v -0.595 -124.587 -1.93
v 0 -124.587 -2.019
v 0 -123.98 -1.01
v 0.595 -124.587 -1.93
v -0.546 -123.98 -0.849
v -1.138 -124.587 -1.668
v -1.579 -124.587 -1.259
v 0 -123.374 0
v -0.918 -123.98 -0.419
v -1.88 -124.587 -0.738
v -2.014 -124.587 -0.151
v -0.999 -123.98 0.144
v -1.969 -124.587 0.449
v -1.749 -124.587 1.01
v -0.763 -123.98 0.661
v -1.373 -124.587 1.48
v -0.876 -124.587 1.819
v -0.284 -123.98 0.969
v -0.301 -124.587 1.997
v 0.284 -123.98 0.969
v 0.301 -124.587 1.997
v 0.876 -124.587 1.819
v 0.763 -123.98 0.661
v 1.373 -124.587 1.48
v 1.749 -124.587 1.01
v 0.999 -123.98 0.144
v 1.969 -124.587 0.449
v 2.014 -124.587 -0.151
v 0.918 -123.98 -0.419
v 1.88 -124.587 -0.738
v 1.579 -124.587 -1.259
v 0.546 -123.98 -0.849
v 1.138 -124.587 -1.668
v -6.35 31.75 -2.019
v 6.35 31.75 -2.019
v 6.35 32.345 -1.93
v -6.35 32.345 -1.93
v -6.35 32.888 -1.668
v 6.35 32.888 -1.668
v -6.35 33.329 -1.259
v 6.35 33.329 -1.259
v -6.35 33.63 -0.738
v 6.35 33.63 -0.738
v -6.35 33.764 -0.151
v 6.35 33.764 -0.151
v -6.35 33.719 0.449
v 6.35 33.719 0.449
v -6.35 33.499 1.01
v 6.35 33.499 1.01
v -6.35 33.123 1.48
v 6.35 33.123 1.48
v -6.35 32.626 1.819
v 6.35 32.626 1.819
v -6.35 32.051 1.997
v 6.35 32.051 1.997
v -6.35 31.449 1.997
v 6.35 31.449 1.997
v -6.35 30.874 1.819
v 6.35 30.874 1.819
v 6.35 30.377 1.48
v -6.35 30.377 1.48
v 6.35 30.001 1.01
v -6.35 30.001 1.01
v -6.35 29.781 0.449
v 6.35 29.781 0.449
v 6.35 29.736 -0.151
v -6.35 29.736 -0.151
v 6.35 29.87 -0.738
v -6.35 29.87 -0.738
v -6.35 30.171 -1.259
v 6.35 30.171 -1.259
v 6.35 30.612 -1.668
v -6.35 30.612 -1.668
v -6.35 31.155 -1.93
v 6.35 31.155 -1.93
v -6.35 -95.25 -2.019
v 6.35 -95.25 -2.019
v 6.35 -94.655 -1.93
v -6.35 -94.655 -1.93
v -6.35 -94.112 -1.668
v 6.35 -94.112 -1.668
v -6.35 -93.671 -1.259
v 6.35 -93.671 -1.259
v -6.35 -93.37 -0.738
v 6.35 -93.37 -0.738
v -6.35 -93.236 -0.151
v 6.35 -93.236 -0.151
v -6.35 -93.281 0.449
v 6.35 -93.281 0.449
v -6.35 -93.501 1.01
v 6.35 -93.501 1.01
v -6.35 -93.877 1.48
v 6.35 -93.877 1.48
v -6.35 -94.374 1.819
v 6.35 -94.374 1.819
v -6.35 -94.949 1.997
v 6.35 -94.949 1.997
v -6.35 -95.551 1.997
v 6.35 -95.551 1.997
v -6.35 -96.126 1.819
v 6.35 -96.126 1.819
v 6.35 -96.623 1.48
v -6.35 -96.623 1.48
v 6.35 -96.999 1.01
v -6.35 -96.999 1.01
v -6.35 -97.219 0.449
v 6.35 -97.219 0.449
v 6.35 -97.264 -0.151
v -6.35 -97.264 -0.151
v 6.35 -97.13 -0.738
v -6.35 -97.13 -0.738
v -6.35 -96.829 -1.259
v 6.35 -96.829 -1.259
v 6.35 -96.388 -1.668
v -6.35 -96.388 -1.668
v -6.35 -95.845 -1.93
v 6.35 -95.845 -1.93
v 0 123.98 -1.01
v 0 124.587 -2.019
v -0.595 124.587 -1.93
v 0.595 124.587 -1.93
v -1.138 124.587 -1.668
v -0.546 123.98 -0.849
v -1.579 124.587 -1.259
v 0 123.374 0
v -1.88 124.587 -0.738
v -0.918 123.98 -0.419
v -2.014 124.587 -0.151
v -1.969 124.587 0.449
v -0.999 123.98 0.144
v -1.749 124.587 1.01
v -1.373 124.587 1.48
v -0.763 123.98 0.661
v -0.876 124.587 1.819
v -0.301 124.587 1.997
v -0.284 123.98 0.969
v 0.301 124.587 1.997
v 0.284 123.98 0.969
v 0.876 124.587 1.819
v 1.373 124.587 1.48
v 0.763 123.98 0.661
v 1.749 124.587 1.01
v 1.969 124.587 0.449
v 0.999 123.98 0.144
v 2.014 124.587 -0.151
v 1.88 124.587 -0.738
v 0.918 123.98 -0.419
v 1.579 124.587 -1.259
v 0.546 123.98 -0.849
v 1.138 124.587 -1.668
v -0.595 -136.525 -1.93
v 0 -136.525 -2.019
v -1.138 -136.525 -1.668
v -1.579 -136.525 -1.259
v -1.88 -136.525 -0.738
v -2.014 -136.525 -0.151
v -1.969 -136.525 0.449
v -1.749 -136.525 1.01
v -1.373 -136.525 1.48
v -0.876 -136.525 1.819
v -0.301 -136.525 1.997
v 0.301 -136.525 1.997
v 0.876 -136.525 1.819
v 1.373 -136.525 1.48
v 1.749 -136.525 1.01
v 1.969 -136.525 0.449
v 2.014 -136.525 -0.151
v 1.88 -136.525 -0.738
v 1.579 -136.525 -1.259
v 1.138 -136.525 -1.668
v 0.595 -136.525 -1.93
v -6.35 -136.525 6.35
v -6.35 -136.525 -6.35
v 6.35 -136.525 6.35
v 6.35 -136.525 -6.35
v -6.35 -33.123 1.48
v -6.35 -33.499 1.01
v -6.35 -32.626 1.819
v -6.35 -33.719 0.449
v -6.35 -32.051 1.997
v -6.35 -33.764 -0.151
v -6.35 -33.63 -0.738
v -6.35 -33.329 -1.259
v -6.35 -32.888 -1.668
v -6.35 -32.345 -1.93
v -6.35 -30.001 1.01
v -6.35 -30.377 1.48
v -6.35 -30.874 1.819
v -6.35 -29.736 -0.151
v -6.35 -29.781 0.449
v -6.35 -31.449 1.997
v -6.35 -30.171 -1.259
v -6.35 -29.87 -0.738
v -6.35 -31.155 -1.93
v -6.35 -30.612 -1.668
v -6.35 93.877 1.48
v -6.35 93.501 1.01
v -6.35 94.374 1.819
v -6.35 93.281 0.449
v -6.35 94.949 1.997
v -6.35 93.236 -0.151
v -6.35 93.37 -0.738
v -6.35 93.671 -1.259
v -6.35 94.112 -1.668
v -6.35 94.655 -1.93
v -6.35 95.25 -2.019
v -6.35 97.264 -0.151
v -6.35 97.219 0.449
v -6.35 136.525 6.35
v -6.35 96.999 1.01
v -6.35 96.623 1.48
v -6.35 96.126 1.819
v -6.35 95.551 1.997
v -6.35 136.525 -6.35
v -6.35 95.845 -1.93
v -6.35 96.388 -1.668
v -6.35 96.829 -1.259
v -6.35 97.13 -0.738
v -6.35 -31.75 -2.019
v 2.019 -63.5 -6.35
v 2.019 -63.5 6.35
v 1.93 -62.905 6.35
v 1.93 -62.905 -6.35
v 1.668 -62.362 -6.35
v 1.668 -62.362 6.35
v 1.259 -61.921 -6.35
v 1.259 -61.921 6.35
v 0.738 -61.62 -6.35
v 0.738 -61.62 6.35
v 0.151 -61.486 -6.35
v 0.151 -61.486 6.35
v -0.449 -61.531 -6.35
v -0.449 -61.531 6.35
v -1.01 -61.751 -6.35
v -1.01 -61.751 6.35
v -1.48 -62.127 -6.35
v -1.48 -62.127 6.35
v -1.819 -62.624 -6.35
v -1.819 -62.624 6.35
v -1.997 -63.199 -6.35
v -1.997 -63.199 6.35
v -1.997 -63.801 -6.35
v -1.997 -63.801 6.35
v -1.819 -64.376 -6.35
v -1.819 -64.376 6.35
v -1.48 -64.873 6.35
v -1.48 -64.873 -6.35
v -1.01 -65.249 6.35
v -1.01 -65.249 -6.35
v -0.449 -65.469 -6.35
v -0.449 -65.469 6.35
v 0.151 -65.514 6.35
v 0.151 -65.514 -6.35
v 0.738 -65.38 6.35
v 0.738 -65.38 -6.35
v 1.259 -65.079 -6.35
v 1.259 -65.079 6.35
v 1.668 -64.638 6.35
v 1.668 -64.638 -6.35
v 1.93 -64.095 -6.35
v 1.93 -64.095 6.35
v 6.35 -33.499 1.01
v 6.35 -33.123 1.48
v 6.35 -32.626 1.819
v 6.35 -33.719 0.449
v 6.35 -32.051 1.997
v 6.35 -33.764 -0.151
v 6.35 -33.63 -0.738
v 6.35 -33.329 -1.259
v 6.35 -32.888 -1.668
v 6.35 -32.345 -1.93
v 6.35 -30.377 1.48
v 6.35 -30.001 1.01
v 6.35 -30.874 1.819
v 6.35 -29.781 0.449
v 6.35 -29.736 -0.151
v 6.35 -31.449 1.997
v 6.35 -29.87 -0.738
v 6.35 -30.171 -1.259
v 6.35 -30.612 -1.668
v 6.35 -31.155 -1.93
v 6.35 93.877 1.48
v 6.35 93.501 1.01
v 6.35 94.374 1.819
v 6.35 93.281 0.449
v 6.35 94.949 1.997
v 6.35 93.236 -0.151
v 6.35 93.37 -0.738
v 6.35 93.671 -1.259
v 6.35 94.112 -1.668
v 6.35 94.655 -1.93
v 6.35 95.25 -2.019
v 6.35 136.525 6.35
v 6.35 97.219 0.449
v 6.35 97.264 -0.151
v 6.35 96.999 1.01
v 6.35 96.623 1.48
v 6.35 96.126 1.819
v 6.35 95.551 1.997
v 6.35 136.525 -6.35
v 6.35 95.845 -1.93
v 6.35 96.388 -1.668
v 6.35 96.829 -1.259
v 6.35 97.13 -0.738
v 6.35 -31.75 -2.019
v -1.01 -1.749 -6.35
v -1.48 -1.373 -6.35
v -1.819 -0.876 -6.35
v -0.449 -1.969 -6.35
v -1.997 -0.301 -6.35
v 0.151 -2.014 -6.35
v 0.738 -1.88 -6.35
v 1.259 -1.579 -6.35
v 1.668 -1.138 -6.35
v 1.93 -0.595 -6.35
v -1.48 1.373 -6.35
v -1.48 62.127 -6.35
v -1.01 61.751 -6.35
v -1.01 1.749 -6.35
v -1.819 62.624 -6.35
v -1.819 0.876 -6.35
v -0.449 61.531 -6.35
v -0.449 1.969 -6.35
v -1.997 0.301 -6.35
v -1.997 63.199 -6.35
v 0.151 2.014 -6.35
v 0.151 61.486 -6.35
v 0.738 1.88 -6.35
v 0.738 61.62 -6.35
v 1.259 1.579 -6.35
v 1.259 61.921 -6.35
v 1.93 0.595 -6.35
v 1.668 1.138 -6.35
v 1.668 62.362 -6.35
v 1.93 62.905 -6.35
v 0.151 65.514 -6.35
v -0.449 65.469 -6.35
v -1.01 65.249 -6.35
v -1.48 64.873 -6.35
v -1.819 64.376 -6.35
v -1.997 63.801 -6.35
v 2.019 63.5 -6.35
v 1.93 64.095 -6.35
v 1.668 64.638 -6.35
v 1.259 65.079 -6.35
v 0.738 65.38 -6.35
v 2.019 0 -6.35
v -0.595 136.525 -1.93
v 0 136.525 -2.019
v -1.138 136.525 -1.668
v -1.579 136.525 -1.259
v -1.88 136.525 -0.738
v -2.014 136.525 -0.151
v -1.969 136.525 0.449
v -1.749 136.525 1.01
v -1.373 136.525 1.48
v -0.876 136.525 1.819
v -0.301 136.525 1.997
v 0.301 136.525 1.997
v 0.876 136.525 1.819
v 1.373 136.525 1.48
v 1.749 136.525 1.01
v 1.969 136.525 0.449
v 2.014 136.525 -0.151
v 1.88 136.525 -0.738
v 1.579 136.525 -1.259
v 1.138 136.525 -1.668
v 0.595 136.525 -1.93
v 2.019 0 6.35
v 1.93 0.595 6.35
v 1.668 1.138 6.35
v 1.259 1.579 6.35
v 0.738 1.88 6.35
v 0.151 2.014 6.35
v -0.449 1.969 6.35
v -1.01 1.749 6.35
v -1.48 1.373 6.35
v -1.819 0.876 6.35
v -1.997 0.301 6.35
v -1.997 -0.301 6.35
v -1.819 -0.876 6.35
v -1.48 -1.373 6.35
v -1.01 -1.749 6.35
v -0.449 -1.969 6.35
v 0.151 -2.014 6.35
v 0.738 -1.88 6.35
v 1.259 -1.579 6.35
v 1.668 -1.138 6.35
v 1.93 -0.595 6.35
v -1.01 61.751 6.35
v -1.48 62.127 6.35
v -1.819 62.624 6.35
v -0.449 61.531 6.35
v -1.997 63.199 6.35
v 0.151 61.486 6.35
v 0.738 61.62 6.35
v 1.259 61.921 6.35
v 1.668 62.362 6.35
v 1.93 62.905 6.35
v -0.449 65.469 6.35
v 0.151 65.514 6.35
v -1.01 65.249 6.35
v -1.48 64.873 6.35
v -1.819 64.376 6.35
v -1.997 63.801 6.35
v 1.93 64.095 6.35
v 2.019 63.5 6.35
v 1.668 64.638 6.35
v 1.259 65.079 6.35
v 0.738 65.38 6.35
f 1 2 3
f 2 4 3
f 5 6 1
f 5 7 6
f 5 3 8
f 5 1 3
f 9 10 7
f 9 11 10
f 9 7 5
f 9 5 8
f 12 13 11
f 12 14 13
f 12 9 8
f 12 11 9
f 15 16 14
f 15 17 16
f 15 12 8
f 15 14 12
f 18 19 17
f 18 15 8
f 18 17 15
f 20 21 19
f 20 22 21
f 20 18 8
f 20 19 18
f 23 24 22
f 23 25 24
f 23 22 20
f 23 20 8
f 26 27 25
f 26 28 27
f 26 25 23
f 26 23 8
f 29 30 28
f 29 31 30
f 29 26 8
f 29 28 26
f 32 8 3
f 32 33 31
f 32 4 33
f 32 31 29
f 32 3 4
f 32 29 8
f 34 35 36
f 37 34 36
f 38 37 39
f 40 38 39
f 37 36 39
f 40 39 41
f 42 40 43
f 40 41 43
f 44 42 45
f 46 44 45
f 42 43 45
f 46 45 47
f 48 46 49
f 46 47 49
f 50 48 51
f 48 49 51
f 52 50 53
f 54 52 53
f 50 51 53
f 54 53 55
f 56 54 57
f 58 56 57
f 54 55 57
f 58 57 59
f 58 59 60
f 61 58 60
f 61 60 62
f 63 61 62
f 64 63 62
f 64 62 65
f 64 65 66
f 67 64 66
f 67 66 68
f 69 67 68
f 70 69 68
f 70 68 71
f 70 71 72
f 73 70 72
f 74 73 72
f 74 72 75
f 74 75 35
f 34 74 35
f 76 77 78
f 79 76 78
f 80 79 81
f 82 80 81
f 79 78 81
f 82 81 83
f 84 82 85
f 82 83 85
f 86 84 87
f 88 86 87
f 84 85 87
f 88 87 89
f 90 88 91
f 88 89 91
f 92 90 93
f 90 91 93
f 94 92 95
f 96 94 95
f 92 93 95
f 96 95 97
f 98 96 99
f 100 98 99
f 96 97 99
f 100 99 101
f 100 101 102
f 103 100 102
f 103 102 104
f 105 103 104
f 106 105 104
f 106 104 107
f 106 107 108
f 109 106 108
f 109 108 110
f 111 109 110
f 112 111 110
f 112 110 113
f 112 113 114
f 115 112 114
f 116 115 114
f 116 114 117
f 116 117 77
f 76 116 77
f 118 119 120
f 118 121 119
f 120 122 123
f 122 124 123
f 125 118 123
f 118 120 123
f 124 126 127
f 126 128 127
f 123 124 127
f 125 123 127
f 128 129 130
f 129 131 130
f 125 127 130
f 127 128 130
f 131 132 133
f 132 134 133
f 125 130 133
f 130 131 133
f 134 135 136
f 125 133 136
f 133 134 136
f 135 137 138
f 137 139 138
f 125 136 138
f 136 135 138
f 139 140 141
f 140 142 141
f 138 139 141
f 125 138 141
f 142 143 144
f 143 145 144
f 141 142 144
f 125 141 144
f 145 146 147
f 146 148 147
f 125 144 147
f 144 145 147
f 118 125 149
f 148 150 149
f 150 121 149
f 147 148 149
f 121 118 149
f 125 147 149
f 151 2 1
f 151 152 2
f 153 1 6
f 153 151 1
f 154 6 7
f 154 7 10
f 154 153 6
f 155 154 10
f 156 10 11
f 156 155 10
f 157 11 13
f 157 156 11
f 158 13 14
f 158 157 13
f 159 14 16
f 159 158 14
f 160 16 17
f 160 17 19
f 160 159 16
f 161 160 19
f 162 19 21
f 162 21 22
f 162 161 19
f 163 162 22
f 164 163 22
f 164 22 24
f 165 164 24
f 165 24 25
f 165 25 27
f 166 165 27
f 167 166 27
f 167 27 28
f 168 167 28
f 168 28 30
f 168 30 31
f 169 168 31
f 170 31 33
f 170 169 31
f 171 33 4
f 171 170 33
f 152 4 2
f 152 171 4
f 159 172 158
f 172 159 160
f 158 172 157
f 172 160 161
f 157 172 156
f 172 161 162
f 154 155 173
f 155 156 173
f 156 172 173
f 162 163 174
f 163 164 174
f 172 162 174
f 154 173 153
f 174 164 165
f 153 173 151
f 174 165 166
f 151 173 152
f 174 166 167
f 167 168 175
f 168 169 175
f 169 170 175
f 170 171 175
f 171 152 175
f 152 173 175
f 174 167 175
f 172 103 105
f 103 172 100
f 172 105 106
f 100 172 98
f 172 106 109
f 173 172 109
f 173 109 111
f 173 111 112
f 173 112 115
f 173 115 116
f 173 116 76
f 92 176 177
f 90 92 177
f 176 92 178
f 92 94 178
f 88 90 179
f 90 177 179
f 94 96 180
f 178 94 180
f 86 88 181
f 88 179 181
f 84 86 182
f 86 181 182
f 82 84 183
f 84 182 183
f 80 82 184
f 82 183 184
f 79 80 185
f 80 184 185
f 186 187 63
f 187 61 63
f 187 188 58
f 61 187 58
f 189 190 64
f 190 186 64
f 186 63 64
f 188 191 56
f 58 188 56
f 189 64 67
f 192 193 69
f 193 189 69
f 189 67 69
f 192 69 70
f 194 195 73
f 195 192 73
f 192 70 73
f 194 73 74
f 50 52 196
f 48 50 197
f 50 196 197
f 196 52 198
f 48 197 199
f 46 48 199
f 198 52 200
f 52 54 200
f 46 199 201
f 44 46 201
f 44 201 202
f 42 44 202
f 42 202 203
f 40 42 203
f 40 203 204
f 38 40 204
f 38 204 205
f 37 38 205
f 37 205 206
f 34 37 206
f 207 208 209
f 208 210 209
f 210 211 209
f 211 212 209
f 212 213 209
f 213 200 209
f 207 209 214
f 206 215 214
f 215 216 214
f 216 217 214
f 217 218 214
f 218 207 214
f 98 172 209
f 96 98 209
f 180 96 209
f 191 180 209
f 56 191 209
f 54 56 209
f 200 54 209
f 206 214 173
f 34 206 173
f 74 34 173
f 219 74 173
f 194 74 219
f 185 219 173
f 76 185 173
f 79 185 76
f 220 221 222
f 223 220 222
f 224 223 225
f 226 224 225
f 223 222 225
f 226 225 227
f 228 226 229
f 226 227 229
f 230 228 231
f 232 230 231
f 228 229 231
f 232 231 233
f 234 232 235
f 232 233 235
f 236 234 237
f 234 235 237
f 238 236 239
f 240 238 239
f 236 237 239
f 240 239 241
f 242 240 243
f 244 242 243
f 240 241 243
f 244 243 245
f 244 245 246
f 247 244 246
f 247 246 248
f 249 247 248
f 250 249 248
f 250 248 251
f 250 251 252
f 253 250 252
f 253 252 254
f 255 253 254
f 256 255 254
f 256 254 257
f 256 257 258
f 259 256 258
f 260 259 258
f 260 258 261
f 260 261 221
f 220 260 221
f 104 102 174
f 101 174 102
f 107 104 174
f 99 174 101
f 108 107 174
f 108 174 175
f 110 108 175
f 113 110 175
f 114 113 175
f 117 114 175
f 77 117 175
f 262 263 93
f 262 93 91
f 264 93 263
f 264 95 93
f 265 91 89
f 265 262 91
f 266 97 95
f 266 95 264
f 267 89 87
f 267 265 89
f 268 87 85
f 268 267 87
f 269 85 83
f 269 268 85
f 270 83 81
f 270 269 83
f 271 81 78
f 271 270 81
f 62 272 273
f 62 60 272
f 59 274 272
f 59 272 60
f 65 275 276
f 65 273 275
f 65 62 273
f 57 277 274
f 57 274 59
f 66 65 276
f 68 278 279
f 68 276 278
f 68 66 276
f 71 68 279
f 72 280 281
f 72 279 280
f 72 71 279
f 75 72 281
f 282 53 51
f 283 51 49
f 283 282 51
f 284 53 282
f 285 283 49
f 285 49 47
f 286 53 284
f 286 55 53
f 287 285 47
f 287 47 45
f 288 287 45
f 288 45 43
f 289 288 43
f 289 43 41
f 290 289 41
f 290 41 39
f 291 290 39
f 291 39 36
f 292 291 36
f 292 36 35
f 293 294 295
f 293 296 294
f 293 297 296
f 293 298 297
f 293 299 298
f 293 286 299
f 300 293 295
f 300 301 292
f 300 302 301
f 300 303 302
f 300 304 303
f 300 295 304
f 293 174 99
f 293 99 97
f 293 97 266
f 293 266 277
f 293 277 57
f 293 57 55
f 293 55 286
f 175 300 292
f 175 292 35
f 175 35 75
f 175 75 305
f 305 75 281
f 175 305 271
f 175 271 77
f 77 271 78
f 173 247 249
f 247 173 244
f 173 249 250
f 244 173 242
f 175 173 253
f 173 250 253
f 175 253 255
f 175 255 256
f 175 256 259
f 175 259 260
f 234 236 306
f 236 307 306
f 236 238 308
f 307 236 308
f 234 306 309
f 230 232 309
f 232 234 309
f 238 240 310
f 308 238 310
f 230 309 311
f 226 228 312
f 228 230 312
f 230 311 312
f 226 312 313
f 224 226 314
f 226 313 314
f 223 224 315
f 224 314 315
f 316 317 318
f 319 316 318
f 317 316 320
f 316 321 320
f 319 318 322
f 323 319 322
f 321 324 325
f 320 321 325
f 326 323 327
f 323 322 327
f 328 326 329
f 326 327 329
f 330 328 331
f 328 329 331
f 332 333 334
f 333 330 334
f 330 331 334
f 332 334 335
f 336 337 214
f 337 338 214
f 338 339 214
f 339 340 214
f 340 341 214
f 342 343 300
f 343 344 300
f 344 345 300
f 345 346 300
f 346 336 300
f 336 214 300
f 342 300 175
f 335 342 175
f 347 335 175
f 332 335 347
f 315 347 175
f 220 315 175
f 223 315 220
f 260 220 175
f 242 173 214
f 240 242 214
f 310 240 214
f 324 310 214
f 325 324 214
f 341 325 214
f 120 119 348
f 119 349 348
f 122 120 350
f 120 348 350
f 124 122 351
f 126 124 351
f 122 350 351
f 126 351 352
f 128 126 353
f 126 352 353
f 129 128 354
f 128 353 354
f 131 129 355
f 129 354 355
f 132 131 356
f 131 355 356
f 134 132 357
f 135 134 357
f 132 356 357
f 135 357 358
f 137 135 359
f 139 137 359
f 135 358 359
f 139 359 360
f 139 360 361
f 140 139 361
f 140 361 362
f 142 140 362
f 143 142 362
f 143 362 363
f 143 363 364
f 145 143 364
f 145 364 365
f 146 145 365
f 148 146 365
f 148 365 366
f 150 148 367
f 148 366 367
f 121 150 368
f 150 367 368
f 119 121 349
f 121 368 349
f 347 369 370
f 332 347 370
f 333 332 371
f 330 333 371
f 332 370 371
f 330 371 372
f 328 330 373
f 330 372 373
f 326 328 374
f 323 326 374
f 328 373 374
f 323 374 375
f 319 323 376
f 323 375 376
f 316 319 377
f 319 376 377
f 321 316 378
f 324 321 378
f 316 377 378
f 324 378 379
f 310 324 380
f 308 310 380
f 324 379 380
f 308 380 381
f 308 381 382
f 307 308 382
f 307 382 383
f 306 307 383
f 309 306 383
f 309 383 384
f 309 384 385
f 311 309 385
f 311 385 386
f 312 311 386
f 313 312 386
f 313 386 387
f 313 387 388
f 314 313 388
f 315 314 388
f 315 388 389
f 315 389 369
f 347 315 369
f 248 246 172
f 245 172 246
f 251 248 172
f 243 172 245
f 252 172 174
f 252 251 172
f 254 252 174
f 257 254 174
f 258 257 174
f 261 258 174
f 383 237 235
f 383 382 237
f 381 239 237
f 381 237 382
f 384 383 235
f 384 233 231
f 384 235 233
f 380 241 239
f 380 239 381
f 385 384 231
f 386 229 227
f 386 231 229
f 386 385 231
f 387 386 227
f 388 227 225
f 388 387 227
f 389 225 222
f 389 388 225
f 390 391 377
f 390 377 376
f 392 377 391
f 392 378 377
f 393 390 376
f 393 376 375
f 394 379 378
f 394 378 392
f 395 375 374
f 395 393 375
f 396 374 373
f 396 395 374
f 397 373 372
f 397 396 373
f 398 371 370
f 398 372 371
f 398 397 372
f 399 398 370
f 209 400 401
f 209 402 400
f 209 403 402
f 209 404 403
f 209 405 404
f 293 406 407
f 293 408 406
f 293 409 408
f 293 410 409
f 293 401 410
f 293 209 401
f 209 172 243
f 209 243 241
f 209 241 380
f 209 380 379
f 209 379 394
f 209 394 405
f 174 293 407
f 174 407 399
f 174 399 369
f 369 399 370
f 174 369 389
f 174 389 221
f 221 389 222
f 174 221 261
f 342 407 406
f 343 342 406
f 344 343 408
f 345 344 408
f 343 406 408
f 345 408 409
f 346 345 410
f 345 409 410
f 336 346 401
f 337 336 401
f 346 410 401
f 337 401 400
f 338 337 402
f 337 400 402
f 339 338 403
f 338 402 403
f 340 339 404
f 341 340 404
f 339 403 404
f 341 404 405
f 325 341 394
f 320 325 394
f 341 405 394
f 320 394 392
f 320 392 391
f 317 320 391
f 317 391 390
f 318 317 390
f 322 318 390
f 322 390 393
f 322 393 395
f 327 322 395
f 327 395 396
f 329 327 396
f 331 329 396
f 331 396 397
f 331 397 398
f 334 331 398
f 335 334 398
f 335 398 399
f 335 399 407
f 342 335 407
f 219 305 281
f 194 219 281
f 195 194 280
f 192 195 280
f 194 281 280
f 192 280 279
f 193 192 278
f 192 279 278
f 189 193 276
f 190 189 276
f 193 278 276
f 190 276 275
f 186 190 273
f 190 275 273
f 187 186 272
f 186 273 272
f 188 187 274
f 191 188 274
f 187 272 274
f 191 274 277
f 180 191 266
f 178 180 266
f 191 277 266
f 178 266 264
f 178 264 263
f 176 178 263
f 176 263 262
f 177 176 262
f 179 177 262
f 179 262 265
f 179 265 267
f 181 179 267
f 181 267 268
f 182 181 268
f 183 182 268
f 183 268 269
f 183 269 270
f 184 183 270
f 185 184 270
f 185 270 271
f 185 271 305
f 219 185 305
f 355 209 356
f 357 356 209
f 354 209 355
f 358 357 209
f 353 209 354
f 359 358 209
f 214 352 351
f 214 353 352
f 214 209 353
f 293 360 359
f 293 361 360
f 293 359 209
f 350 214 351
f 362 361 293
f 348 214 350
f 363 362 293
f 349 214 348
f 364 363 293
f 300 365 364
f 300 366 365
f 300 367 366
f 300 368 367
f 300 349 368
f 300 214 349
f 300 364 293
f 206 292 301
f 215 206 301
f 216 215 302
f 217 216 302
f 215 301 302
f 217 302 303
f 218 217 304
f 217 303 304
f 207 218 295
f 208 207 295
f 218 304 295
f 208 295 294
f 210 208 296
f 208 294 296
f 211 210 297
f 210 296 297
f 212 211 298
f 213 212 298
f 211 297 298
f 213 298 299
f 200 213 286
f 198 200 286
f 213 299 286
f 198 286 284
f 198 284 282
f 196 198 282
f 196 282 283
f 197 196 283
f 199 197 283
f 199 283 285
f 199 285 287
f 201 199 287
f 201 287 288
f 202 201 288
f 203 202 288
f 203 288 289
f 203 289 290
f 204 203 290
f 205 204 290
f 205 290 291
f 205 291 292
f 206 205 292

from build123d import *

# Parameters (mm, degrees)
SKETCH1_W              = 12.7
SKETCH1_H              = 12.7
BOSS_EXTRUDE1_DEPTH    = 136.525
F_10_32_TAPPED_HOLE4_D = 4.0386
F_10_32_TAPPED_HOLE5_D = 4.0386


with BuildPart() as part:
    # Sketch1 → Boss-Extrude1 (new, symmetric)
    with BuildSketch(Plane(origin=(0, 0, 0), x_dir=(1, 0, 0), z_dir=(0, 1, 0))):
        Rectangle(SKETCH1_W, SKETCH1_H)
    extrude(amount=BOSS_EXTRUDE1_DEPTH, both=True)

    # Sketch14 → #10-32 Tapped Hole3 (revolve, cut)
    with BuildSketch(Plane(origin=(0, -136.525, 0), x_dir=(0, 0, -1), z_dir=(1, 0, 0))):
        Polygon((0, 0), (0, 13.151317848), (2.0193, 11.938), (2.0193, 0), align=None)
    f_10_32_tapped_hole3 = revolve(axis=Axis((0, -142.875, 0), (0, 1, 0)), mode=Mode.SUBTRACT)

    # Mirror1: #10-32 Tapped Hole3 across plane
    add(f_10_32_tapped_hole3.mirror(Plane.ZX), mode=Mode.SUBTRACT)

    # #10-32 Tapped Hole4 (through all)
    with Locations(Plane(origin=(0, 0, -6.35), x_dir=(-1, 0, 0), z_dir=(0, 0, -1))):
        with Locations((0, 63.5), (0, 0), (0, -63.5)):
            Hole(F_10_32_TAPPED_HOLE4_D / 2)

    # #10-32 Tapped Hole5 (through all)
    with Locations(Plane.ZY.offset(6.35)):
        with Locations((0, 95.25), (0, 31.75), (0, -31.75), (0, -95.25)):
            Hole(F_10_32_TAPPED_HOLE5_D / 2)


solid = part.part
